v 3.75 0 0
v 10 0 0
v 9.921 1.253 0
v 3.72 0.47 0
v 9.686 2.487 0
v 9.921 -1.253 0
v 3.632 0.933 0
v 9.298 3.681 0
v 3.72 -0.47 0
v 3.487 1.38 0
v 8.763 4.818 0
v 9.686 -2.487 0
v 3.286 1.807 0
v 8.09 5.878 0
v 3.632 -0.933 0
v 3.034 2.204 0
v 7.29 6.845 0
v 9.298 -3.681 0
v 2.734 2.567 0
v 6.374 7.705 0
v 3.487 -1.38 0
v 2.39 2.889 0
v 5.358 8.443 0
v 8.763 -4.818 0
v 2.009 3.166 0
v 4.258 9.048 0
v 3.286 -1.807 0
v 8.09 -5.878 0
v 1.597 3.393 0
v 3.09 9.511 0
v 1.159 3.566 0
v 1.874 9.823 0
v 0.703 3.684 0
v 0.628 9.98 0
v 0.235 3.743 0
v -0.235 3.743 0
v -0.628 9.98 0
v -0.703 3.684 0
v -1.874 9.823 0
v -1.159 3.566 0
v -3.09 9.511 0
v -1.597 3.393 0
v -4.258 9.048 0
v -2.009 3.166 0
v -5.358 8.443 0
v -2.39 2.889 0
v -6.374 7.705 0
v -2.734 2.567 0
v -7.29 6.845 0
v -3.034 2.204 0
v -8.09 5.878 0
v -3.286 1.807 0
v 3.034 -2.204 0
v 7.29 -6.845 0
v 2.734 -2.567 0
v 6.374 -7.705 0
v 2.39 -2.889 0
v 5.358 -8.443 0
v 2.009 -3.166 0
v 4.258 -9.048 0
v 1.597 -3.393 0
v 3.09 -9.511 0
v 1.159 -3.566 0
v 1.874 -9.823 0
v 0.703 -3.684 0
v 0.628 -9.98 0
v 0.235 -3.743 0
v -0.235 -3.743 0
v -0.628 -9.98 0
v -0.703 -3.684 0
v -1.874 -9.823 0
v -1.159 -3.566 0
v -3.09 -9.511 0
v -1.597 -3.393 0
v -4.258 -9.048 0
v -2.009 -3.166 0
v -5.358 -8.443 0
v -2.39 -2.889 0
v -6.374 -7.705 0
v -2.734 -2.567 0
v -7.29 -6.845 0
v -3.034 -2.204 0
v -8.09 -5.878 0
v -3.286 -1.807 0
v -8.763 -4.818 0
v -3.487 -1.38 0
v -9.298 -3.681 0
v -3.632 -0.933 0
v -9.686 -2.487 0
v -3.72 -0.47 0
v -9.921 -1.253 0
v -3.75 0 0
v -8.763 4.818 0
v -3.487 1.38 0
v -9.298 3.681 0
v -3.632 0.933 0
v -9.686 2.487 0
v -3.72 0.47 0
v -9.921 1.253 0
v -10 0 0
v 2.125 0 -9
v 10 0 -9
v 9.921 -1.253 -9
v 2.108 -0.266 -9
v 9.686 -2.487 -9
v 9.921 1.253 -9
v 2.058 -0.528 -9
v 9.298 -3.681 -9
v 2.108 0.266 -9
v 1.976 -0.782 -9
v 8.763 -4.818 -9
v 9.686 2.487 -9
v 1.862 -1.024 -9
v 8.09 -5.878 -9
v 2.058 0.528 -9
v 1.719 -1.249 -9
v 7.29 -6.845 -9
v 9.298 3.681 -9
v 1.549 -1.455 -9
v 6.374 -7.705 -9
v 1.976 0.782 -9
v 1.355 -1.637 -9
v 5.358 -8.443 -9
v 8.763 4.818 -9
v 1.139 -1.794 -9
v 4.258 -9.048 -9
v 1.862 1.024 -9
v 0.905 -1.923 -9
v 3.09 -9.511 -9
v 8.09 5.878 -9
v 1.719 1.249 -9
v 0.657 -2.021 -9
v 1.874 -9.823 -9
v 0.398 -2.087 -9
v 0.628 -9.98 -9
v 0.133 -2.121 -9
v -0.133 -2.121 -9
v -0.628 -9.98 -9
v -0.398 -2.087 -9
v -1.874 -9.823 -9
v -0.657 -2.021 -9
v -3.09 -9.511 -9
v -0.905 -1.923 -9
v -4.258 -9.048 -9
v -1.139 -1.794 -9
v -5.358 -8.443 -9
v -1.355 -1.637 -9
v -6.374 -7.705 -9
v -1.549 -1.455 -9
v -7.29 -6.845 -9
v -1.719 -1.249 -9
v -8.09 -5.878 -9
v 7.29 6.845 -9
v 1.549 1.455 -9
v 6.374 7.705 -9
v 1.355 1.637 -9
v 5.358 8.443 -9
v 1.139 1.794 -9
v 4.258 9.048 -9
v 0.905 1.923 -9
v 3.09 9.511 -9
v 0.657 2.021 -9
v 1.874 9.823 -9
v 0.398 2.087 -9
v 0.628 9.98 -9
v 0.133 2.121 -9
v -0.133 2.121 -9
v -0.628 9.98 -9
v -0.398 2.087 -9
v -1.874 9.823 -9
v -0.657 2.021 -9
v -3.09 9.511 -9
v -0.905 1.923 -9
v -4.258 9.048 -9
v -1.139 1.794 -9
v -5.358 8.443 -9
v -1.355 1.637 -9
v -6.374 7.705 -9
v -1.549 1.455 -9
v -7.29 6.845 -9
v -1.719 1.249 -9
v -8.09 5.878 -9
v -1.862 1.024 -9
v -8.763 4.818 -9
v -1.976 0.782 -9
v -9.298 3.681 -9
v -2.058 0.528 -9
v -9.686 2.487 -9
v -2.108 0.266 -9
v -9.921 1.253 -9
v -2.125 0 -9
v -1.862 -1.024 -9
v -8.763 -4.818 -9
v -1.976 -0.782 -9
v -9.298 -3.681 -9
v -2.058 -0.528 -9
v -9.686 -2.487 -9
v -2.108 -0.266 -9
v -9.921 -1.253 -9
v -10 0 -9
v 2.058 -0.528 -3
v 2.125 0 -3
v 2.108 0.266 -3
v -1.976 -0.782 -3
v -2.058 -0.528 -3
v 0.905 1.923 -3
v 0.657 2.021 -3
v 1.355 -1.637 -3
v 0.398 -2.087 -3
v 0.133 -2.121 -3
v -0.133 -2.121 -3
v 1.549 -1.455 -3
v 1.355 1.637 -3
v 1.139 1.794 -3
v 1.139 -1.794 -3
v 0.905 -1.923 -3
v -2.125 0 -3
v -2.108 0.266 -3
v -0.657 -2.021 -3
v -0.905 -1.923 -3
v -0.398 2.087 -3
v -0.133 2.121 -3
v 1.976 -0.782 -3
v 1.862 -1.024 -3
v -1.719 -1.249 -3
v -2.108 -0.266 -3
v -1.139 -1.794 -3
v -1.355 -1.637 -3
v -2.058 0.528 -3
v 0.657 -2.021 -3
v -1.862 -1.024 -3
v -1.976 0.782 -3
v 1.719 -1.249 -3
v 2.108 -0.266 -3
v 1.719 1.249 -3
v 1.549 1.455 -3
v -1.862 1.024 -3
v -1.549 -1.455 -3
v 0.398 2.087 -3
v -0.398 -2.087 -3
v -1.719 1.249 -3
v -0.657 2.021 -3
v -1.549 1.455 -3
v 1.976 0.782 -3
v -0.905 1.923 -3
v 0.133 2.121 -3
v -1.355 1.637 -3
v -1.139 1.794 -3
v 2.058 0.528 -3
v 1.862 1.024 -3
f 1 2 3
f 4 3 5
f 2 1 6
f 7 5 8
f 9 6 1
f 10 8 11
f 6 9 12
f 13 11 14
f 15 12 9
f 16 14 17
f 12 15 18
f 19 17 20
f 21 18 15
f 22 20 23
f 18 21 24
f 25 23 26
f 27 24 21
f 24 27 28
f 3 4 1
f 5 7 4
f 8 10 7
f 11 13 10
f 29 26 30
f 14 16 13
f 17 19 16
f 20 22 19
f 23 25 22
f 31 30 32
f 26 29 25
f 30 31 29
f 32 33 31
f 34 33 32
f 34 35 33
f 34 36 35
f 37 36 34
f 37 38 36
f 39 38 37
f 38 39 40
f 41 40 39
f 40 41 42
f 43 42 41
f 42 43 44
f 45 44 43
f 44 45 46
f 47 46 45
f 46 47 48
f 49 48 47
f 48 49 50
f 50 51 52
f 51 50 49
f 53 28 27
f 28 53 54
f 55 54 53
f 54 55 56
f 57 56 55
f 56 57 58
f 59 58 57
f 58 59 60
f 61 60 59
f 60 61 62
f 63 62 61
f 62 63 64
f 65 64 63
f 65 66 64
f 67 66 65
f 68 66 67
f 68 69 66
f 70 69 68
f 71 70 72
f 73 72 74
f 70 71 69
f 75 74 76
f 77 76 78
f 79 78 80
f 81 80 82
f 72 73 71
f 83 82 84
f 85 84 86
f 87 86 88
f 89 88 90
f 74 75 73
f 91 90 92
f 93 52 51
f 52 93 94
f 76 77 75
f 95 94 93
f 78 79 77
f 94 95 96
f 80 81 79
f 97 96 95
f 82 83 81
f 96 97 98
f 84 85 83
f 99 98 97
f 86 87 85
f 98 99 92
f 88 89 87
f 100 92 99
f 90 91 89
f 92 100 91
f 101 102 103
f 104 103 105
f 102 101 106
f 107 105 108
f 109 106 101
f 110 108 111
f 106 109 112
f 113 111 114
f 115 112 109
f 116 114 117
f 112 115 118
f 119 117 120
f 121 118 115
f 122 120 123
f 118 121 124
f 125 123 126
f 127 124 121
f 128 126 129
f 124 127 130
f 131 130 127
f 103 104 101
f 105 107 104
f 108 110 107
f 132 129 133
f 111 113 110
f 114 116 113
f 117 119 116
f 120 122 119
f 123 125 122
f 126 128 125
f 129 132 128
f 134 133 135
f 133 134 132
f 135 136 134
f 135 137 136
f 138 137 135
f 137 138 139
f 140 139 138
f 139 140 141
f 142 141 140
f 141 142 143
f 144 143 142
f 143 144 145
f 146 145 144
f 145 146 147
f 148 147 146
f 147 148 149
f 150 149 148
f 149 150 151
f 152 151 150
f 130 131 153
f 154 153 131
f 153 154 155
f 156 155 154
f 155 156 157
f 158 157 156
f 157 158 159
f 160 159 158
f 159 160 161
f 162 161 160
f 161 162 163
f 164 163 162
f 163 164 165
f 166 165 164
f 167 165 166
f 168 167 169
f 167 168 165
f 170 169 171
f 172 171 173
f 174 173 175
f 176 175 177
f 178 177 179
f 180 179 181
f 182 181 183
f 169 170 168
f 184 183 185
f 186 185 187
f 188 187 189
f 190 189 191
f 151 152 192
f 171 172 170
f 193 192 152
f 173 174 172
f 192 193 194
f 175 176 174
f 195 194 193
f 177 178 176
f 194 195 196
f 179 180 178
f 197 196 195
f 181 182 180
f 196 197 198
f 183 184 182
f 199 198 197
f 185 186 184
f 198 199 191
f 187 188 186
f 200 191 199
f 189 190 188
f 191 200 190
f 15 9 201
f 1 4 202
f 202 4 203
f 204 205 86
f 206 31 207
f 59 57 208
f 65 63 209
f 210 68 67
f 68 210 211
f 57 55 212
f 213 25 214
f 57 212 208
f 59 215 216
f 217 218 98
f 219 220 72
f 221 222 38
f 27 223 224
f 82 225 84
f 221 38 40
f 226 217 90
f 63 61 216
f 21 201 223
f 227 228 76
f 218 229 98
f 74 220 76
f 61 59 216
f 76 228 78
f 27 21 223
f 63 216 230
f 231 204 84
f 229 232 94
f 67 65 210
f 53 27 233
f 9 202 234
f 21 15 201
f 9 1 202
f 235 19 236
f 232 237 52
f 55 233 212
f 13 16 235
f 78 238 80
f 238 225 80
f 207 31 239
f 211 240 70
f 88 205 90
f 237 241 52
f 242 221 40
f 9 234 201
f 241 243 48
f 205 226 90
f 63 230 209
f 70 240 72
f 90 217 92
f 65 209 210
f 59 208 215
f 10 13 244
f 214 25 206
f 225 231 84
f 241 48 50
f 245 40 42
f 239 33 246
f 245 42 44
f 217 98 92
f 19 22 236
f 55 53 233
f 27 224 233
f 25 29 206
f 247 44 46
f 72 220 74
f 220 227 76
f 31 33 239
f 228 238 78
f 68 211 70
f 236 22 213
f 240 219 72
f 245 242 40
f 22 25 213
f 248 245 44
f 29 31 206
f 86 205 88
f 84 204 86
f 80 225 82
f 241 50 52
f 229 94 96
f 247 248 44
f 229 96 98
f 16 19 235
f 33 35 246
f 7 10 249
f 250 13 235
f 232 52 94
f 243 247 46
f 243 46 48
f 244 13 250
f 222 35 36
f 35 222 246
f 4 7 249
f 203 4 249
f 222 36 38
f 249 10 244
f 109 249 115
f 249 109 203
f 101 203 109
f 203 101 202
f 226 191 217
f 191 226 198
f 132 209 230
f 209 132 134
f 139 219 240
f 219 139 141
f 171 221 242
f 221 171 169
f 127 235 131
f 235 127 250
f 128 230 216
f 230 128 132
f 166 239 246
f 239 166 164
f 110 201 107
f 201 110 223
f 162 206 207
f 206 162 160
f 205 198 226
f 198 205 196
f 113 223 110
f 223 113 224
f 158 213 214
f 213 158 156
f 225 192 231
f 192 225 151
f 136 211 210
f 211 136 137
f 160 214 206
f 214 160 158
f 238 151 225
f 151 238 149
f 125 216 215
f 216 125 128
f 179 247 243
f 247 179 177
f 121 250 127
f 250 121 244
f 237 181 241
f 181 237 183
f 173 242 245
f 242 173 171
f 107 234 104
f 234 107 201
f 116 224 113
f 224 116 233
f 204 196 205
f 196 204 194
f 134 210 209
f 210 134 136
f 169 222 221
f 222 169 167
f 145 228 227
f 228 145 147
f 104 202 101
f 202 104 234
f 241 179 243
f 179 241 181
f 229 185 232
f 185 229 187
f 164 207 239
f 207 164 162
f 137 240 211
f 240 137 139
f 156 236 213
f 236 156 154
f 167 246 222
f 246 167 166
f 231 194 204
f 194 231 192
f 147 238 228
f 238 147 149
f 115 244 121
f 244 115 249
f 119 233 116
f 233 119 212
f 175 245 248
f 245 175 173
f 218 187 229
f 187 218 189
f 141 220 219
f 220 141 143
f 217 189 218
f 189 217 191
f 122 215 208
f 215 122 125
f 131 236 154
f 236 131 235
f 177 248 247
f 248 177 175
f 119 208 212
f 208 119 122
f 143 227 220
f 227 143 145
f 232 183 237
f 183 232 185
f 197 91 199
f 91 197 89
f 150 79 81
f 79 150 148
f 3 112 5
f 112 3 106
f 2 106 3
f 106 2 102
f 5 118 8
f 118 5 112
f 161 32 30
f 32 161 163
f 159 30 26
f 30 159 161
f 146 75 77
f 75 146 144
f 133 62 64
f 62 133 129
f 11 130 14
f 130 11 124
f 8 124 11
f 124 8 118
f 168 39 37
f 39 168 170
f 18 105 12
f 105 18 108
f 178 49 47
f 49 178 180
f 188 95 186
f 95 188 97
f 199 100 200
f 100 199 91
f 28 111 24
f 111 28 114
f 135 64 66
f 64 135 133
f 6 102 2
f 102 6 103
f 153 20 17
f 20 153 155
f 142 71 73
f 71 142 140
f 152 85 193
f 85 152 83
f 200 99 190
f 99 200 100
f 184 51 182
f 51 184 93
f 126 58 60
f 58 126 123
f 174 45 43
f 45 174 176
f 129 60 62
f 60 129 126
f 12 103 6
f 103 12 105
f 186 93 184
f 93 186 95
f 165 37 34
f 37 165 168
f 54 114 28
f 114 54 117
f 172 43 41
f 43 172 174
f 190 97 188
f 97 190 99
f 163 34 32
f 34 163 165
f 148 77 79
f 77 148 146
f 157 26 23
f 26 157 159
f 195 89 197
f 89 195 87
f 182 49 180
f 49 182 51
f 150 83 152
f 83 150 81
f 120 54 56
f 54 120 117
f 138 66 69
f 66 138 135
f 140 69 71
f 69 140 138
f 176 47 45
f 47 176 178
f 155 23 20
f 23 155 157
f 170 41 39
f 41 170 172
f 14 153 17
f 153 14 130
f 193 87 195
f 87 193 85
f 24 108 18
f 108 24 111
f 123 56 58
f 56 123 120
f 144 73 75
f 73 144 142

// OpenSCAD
$fn = 50;


difference() {
	union() {
		translate(v = [0, 0, -9.0000000000]) {
			cylinder(h = 9, r = 10.0000000000);
		}
	}
	union() {
		translate(v = [0, 0, 0]) {
			rotate(a = [0, 0, 0]) {
				difference() {
					union() {
						#translate(v = [0, 0, -9.0000000000]) {
							cylinder(h = 9, r = 2.0000000000);
						}
						#translate(v = [0, 0, -3]) {
							cylinder(h = 3, r1 = 2.1250000000, r2 = 3.7500000000);
						}
						#translate(v = [0, 0, -9.0000000000]) {
							cylinder(h = 9, r = 2.1250000000);
						}
						#translate(v = [0, 0, -9.0000000000]) {
							cylinder(h = 9, r = 2.0000000000);
						}
					}
					union();
				}
			}
		}
	}
}
